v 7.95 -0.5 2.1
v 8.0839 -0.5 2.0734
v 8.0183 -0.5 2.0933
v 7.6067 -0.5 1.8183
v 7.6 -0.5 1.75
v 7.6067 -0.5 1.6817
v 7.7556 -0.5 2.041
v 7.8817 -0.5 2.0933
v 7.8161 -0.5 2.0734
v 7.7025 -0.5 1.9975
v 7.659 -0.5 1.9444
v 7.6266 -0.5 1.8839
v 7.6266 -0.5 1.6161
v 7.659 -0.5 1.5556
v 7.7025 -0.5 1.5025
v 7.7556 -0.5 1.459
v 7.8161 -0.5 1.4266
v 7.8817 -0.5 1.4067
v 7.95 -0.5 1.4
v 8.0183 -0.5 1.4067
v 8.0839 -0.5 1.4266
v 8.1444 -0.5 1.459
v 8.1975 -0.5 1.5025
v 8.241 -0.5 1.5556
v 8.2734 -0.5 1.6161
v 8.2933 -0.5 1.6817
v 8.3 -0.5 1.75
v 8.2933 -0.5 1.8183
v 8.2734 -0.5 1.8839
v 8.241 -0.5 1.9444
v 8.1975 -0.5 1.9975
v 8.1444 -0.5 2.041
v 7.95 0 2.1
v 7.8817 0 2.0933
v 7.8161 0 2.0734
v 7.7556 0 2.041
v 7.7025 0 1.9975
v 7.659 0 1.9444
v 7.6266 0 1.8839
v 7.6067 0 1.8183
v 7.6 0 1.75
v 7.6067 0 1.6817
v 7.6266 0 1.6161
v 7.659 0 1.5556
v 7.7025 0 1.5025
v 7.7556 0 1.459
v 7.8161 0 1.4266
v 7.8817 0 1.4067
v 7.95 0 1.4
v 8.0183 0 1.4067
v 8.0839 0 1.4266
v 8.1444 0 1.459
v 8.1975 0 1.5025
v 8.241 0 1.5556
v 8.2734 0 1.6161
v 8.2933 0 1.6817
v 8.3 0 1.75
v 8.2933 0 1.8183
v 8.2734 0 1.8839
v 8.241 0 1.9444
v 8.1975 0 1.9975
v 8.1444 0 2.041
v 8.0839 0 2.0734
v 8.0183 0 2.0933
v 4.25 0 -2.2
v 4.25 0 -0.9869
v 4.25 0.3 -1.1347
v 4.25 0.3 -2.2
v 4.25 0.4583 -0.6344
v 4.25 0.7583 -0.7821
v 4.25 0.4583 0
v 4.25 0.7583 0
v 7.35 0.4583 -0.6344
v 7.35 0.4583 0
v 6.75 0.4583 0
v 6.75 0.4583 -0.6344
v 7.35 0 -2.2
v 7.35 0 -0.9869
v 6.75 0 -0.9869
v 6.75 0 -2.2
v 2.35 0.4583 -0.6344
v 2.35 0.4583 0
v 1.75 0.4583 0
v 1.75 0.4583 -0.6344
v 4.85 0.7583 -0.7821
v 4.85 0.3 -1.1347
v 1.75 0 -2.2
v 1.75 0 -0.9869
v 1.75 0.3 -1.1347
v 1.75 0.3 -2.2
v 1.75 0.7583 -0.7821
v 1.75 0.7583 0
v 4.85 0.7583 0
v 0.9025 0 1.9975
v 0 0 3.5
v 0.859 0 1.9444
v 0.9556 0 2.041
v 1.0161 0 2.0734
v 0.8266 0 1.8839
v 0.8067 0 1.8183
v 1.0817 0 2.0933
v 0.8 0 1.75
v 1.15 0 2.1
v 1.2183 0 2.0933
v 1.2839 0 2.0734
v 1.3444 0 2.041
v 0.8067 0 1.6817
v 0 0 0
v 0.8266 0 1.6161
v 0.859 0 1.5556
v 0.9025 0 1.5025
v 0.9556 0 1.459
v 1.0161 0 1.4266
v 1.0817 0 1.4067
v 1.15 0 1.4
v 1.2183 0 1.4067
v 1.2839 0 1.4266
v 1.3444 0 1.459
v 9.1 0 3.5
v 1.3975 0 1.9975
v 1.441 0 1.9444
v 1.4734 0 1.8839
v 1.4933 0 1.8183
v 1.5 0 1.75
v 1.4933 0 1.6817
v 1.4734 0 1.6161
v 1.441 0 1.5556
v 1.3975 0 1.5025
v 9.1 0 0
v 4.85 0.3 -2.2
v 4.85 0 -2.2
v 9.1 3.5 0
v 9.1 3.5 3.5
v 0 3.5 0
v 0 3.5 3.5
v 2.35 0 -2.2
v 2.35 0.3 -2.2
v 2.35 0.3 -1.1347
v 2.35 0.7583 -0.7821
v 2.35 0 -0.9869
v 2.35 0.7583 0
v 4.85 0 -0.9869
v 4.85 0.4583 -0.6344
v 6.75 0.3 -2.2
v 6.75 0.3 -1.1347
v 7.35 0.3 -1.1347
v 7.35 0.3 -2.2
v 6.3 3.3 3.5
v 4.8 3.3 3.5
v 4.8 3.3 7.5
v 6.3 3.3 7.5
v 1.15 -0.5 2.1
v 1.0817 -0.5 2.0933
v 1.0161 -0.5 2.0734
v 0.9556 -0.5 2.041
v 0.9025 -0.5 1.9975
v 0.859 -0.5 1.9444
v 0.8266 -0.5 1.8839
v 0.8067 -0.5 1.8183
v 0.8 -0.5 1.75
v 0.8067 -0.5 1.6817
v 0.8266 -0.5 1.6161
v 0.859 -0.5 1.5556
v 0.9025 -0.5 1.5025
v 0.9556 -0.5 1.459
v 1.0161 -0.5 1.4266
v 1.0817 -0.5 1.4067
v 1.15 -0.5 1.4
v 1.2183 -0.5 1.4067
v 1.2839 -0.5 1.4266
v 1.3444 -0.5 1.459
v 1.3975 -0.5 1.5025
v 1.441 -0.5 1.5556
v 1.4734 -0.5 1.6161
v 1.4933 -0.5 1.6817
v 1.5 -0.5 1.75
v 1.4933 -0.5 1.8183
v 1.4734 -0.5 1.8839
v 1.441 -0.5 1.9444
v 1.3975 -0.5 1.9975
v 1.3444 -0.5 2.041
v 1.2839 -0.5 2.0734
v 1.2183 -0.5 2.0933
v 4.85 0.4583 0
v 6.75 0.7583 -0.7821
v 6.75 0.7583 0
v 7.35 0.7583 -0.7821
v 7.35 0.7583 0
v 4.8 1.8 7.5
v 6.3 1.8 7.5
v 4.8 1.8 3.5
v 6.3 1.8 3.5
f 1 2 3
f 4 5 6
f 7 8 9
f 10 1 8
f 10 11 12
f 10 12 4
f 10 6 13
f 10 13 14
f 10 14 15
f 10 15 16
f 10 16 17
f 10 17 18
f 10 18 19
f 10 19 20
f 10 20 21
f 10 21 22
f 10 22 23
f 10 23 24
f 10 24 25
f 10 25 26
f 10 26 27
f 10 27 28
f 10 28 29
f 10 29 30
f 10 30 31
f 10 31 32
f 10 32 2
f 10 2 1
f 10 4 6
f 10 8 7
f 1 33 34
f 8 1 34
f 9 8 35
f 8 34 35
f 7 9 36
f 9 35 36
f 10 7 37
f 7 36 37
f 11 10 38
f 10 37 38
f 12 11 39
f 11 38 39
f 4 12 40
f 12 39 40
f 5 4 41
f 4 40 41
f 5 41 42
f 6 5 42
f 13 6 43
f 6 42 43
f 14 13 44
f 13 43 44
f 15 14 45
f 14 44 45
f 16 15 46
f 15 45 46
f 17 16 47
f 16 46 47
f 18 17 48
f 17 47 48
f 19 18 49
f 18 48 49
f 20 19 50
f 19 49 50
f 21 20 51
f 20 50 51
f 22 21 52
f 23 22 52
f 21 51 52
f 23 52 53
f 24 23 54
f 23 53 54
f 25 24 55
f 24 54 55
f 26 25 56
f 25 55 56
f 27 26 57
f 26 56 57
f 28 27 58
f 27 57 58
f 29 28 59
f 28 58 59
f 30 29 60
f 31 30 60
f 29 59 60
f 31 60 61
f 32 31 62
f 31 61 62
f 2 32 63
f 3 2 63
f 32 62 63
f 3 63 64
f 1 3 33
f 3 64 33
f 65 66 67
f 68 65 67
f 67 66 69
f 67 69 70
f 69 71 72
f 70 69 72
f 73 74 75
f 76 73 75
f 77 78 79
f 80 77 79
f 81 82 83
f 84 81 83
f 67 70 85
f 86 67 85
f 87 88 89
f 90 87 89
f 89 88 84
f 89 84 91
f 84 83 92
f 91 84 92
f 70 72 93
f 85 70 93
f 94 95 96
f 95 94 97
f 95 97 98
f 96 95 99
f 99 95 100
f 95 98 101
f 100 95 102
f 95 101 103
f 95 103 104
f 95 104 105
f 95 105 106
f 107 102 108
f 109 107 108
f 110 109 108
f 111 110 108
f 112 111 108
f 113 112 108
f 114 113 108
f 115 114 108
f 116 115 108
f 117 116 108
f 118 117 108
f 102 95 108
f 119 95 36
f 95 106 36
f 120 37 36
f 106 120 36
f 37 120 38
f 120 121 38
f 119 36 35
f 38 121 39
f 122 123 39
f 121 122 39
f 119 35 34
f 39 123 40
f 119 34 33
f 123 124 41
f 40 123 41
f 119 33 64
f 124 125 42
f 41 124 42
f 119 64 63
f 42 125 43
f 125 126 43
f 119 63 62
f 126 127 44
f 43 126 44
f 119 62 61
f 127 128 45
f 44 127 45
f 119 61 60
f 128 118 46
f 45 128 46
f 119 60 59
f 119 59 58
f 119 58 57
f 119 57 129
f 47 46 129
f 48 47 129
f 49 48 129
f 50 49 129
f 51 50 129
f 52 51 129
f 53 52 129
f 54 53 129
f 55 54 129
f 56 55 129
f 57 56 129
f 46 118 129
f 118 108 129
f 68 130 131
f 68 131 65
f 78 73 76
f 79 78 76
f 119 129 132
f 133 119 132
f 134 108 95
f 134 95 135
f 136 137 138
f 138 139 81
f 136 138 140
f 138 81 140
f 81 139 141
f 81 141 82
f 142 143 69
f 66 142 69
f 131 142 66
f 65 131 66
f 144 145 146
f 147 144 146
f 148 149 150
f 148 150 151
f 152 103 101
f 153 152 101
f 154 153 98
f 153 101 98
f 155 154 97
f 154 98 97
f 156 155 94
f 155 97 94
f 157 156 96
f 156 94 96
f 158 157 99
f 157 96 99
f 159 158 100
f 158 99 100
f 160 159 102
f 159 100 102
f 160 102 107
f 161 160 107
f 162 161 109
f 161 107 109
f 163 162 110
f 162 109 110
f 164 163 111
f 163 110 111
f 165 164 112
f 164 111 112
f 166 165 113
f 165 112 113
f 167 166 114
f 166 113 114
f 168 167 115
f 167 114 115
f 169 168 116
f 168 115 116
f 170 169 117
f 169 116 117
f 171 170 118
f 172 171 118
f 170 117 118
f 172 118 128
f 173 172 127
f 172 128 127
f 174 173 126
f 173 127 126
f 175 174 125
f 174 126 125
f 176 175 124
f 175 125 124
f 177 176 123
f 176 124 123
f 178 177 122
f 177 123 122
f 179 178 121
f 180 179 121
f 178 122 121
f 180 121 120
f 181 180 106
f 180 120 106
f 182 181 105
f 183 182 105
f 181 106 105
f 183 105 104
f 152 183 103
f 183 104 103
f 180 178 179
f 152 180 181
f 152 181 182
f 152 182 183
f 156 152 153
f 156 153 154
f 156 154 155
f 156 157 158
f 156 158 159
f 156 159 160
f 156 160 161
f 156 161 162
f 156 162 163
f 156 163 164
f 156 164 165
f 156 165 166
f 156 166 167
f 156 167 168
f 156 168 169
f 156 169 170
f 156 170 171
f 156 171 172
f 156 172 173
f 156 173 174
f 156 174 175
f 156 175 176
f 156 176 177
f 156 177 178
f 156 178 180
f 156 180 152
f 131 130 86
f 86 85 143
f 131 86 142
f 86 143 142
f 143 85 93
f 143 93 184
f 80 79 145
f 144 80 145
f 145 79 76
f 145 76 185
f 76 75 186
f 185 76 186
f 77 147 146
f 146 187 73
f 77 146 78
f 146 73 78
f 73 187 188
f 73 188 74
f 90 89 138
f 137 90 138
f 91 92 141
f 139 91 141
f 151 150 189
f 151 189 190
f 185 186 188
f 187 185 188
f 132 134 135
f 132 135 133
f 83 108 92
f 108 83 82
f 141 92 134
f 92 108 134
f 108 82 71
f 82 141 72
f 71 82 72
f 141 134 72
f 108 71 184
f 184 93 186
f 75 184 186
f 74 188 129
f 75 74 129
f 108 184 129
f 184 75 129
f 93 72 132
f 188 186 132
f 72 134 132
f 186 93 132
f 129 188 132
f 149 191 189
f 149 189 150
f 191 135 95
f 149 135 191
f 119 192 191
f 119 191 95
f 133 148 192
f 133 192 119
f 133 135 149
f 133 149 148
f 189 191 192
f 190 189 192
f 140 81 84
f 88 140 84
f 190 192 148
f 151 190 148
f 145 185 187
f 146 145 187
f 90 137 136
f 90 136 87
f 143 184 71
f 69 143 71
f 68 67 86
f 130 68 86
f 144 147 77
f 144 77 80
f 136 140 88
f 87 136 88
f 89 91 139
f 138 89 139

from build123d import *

# Parameters (mm, degrees)
SKETCH_1_W                 = 9.1
SKETCH_1_H                 = 3.5
EXTRUDE_1_DEPTH            = 3.5
SKETCH_2_W                 = 1.5
SKETCH_2_H                 = 1.5
EXTRUDE_2_DEPTH            = 4
SKETCH_3_R                 = 0.35
EXTRUDE_3_DEPTH            = 0.5
SKETCH_5_W                 = 0.6
SKETCH_5_H                 = 0.3
PATTERN_LINEAR_1_COUNT     = 2
PATTERN_LINEAR_1_PITCH     = 2.5
PATTERN_LINEAR_1_COL_COUNT = 2
PATTERN_LINEAR_1_COL_PITCH = 2.5


with BuildPart() as part:
    # 草图1 → 凸台-拉伸1 (new body)
    with BuildSketch(Plane.XY):
        with Locations((4.55, 1.75)):
            Rectangle(SKETCH_1_W, SKETCH_1_H)
    extrude(amount=EXTRUDE_1_DEPTH)

    # 草图2 → 凸台-拉伸2 (add)
    with BuildSketch(Plane.XY.offset(3.5)):
        with Locations((5.55, 2.55)):
            Rectangle(SKETCH_2_W, SKETCH_2_H)
    extrude(amount=EXTRUDE_2_DEPTH)

    # 草图3 → 凸台-拉伸3 (add)
    with BuildSketch(Plane.XZ):
        with Locations(Location((1.15, 1.75, 0), (0, 0, 90))):
            Circle(SKETCH_3_R)
        with Locations(Location((7.95, 1.75, 0), (0, 0, 90))):
            Circle(SKETCH_3_R)
    extrude(amount=EXTRUDE_3_DEPTH)

    # 扫描1: sweep along a path in 草图4
    with BuildLine(Plane.ZY.offset(-4.55)) as sweep_1_path:
        Line((-2.2, 0.15), (-1.060798769, 0.15))
        Line((-1.060798769, 0.15), (-0.708229264, 0.608340356))
        Line((-0.708229264, 0.608340356), (0, 0.608340356))
    # 草图5 → 扫描1 (sweep)
    with BuildSketch(Plane(origin=(0, 0, -2.2), x_dir=(-1, 0, 0), z_dir=(0, 0, -1))):
        with Locations((-4.55, 0.15)):
            Rectangle(SKETCH_5_W, SKETCH_5_H)
    sweep_1 = sweep(path=sweep_1_path.line, transition=Transition.RIGHT)

    # 阵列(线性)1: 扫描1 ×2
    with Locations(*[(i * PATTERN_LINEAR_1_PITCH, 0, 0) for i in range(1, PATTERN_LINEAR_1_COUNT)]):
        add(sweep_1)

    # 阵列(线性)1 col: 扫描1 ×2
    with Locations(*[(-i * PATTERN_LINEAR_1_COL_PITCH, 0, 0) for i in range(1, PATTERN_LINEAR_1_COL_COUNT)]):
        add(sweep_1)


solid = part.part
